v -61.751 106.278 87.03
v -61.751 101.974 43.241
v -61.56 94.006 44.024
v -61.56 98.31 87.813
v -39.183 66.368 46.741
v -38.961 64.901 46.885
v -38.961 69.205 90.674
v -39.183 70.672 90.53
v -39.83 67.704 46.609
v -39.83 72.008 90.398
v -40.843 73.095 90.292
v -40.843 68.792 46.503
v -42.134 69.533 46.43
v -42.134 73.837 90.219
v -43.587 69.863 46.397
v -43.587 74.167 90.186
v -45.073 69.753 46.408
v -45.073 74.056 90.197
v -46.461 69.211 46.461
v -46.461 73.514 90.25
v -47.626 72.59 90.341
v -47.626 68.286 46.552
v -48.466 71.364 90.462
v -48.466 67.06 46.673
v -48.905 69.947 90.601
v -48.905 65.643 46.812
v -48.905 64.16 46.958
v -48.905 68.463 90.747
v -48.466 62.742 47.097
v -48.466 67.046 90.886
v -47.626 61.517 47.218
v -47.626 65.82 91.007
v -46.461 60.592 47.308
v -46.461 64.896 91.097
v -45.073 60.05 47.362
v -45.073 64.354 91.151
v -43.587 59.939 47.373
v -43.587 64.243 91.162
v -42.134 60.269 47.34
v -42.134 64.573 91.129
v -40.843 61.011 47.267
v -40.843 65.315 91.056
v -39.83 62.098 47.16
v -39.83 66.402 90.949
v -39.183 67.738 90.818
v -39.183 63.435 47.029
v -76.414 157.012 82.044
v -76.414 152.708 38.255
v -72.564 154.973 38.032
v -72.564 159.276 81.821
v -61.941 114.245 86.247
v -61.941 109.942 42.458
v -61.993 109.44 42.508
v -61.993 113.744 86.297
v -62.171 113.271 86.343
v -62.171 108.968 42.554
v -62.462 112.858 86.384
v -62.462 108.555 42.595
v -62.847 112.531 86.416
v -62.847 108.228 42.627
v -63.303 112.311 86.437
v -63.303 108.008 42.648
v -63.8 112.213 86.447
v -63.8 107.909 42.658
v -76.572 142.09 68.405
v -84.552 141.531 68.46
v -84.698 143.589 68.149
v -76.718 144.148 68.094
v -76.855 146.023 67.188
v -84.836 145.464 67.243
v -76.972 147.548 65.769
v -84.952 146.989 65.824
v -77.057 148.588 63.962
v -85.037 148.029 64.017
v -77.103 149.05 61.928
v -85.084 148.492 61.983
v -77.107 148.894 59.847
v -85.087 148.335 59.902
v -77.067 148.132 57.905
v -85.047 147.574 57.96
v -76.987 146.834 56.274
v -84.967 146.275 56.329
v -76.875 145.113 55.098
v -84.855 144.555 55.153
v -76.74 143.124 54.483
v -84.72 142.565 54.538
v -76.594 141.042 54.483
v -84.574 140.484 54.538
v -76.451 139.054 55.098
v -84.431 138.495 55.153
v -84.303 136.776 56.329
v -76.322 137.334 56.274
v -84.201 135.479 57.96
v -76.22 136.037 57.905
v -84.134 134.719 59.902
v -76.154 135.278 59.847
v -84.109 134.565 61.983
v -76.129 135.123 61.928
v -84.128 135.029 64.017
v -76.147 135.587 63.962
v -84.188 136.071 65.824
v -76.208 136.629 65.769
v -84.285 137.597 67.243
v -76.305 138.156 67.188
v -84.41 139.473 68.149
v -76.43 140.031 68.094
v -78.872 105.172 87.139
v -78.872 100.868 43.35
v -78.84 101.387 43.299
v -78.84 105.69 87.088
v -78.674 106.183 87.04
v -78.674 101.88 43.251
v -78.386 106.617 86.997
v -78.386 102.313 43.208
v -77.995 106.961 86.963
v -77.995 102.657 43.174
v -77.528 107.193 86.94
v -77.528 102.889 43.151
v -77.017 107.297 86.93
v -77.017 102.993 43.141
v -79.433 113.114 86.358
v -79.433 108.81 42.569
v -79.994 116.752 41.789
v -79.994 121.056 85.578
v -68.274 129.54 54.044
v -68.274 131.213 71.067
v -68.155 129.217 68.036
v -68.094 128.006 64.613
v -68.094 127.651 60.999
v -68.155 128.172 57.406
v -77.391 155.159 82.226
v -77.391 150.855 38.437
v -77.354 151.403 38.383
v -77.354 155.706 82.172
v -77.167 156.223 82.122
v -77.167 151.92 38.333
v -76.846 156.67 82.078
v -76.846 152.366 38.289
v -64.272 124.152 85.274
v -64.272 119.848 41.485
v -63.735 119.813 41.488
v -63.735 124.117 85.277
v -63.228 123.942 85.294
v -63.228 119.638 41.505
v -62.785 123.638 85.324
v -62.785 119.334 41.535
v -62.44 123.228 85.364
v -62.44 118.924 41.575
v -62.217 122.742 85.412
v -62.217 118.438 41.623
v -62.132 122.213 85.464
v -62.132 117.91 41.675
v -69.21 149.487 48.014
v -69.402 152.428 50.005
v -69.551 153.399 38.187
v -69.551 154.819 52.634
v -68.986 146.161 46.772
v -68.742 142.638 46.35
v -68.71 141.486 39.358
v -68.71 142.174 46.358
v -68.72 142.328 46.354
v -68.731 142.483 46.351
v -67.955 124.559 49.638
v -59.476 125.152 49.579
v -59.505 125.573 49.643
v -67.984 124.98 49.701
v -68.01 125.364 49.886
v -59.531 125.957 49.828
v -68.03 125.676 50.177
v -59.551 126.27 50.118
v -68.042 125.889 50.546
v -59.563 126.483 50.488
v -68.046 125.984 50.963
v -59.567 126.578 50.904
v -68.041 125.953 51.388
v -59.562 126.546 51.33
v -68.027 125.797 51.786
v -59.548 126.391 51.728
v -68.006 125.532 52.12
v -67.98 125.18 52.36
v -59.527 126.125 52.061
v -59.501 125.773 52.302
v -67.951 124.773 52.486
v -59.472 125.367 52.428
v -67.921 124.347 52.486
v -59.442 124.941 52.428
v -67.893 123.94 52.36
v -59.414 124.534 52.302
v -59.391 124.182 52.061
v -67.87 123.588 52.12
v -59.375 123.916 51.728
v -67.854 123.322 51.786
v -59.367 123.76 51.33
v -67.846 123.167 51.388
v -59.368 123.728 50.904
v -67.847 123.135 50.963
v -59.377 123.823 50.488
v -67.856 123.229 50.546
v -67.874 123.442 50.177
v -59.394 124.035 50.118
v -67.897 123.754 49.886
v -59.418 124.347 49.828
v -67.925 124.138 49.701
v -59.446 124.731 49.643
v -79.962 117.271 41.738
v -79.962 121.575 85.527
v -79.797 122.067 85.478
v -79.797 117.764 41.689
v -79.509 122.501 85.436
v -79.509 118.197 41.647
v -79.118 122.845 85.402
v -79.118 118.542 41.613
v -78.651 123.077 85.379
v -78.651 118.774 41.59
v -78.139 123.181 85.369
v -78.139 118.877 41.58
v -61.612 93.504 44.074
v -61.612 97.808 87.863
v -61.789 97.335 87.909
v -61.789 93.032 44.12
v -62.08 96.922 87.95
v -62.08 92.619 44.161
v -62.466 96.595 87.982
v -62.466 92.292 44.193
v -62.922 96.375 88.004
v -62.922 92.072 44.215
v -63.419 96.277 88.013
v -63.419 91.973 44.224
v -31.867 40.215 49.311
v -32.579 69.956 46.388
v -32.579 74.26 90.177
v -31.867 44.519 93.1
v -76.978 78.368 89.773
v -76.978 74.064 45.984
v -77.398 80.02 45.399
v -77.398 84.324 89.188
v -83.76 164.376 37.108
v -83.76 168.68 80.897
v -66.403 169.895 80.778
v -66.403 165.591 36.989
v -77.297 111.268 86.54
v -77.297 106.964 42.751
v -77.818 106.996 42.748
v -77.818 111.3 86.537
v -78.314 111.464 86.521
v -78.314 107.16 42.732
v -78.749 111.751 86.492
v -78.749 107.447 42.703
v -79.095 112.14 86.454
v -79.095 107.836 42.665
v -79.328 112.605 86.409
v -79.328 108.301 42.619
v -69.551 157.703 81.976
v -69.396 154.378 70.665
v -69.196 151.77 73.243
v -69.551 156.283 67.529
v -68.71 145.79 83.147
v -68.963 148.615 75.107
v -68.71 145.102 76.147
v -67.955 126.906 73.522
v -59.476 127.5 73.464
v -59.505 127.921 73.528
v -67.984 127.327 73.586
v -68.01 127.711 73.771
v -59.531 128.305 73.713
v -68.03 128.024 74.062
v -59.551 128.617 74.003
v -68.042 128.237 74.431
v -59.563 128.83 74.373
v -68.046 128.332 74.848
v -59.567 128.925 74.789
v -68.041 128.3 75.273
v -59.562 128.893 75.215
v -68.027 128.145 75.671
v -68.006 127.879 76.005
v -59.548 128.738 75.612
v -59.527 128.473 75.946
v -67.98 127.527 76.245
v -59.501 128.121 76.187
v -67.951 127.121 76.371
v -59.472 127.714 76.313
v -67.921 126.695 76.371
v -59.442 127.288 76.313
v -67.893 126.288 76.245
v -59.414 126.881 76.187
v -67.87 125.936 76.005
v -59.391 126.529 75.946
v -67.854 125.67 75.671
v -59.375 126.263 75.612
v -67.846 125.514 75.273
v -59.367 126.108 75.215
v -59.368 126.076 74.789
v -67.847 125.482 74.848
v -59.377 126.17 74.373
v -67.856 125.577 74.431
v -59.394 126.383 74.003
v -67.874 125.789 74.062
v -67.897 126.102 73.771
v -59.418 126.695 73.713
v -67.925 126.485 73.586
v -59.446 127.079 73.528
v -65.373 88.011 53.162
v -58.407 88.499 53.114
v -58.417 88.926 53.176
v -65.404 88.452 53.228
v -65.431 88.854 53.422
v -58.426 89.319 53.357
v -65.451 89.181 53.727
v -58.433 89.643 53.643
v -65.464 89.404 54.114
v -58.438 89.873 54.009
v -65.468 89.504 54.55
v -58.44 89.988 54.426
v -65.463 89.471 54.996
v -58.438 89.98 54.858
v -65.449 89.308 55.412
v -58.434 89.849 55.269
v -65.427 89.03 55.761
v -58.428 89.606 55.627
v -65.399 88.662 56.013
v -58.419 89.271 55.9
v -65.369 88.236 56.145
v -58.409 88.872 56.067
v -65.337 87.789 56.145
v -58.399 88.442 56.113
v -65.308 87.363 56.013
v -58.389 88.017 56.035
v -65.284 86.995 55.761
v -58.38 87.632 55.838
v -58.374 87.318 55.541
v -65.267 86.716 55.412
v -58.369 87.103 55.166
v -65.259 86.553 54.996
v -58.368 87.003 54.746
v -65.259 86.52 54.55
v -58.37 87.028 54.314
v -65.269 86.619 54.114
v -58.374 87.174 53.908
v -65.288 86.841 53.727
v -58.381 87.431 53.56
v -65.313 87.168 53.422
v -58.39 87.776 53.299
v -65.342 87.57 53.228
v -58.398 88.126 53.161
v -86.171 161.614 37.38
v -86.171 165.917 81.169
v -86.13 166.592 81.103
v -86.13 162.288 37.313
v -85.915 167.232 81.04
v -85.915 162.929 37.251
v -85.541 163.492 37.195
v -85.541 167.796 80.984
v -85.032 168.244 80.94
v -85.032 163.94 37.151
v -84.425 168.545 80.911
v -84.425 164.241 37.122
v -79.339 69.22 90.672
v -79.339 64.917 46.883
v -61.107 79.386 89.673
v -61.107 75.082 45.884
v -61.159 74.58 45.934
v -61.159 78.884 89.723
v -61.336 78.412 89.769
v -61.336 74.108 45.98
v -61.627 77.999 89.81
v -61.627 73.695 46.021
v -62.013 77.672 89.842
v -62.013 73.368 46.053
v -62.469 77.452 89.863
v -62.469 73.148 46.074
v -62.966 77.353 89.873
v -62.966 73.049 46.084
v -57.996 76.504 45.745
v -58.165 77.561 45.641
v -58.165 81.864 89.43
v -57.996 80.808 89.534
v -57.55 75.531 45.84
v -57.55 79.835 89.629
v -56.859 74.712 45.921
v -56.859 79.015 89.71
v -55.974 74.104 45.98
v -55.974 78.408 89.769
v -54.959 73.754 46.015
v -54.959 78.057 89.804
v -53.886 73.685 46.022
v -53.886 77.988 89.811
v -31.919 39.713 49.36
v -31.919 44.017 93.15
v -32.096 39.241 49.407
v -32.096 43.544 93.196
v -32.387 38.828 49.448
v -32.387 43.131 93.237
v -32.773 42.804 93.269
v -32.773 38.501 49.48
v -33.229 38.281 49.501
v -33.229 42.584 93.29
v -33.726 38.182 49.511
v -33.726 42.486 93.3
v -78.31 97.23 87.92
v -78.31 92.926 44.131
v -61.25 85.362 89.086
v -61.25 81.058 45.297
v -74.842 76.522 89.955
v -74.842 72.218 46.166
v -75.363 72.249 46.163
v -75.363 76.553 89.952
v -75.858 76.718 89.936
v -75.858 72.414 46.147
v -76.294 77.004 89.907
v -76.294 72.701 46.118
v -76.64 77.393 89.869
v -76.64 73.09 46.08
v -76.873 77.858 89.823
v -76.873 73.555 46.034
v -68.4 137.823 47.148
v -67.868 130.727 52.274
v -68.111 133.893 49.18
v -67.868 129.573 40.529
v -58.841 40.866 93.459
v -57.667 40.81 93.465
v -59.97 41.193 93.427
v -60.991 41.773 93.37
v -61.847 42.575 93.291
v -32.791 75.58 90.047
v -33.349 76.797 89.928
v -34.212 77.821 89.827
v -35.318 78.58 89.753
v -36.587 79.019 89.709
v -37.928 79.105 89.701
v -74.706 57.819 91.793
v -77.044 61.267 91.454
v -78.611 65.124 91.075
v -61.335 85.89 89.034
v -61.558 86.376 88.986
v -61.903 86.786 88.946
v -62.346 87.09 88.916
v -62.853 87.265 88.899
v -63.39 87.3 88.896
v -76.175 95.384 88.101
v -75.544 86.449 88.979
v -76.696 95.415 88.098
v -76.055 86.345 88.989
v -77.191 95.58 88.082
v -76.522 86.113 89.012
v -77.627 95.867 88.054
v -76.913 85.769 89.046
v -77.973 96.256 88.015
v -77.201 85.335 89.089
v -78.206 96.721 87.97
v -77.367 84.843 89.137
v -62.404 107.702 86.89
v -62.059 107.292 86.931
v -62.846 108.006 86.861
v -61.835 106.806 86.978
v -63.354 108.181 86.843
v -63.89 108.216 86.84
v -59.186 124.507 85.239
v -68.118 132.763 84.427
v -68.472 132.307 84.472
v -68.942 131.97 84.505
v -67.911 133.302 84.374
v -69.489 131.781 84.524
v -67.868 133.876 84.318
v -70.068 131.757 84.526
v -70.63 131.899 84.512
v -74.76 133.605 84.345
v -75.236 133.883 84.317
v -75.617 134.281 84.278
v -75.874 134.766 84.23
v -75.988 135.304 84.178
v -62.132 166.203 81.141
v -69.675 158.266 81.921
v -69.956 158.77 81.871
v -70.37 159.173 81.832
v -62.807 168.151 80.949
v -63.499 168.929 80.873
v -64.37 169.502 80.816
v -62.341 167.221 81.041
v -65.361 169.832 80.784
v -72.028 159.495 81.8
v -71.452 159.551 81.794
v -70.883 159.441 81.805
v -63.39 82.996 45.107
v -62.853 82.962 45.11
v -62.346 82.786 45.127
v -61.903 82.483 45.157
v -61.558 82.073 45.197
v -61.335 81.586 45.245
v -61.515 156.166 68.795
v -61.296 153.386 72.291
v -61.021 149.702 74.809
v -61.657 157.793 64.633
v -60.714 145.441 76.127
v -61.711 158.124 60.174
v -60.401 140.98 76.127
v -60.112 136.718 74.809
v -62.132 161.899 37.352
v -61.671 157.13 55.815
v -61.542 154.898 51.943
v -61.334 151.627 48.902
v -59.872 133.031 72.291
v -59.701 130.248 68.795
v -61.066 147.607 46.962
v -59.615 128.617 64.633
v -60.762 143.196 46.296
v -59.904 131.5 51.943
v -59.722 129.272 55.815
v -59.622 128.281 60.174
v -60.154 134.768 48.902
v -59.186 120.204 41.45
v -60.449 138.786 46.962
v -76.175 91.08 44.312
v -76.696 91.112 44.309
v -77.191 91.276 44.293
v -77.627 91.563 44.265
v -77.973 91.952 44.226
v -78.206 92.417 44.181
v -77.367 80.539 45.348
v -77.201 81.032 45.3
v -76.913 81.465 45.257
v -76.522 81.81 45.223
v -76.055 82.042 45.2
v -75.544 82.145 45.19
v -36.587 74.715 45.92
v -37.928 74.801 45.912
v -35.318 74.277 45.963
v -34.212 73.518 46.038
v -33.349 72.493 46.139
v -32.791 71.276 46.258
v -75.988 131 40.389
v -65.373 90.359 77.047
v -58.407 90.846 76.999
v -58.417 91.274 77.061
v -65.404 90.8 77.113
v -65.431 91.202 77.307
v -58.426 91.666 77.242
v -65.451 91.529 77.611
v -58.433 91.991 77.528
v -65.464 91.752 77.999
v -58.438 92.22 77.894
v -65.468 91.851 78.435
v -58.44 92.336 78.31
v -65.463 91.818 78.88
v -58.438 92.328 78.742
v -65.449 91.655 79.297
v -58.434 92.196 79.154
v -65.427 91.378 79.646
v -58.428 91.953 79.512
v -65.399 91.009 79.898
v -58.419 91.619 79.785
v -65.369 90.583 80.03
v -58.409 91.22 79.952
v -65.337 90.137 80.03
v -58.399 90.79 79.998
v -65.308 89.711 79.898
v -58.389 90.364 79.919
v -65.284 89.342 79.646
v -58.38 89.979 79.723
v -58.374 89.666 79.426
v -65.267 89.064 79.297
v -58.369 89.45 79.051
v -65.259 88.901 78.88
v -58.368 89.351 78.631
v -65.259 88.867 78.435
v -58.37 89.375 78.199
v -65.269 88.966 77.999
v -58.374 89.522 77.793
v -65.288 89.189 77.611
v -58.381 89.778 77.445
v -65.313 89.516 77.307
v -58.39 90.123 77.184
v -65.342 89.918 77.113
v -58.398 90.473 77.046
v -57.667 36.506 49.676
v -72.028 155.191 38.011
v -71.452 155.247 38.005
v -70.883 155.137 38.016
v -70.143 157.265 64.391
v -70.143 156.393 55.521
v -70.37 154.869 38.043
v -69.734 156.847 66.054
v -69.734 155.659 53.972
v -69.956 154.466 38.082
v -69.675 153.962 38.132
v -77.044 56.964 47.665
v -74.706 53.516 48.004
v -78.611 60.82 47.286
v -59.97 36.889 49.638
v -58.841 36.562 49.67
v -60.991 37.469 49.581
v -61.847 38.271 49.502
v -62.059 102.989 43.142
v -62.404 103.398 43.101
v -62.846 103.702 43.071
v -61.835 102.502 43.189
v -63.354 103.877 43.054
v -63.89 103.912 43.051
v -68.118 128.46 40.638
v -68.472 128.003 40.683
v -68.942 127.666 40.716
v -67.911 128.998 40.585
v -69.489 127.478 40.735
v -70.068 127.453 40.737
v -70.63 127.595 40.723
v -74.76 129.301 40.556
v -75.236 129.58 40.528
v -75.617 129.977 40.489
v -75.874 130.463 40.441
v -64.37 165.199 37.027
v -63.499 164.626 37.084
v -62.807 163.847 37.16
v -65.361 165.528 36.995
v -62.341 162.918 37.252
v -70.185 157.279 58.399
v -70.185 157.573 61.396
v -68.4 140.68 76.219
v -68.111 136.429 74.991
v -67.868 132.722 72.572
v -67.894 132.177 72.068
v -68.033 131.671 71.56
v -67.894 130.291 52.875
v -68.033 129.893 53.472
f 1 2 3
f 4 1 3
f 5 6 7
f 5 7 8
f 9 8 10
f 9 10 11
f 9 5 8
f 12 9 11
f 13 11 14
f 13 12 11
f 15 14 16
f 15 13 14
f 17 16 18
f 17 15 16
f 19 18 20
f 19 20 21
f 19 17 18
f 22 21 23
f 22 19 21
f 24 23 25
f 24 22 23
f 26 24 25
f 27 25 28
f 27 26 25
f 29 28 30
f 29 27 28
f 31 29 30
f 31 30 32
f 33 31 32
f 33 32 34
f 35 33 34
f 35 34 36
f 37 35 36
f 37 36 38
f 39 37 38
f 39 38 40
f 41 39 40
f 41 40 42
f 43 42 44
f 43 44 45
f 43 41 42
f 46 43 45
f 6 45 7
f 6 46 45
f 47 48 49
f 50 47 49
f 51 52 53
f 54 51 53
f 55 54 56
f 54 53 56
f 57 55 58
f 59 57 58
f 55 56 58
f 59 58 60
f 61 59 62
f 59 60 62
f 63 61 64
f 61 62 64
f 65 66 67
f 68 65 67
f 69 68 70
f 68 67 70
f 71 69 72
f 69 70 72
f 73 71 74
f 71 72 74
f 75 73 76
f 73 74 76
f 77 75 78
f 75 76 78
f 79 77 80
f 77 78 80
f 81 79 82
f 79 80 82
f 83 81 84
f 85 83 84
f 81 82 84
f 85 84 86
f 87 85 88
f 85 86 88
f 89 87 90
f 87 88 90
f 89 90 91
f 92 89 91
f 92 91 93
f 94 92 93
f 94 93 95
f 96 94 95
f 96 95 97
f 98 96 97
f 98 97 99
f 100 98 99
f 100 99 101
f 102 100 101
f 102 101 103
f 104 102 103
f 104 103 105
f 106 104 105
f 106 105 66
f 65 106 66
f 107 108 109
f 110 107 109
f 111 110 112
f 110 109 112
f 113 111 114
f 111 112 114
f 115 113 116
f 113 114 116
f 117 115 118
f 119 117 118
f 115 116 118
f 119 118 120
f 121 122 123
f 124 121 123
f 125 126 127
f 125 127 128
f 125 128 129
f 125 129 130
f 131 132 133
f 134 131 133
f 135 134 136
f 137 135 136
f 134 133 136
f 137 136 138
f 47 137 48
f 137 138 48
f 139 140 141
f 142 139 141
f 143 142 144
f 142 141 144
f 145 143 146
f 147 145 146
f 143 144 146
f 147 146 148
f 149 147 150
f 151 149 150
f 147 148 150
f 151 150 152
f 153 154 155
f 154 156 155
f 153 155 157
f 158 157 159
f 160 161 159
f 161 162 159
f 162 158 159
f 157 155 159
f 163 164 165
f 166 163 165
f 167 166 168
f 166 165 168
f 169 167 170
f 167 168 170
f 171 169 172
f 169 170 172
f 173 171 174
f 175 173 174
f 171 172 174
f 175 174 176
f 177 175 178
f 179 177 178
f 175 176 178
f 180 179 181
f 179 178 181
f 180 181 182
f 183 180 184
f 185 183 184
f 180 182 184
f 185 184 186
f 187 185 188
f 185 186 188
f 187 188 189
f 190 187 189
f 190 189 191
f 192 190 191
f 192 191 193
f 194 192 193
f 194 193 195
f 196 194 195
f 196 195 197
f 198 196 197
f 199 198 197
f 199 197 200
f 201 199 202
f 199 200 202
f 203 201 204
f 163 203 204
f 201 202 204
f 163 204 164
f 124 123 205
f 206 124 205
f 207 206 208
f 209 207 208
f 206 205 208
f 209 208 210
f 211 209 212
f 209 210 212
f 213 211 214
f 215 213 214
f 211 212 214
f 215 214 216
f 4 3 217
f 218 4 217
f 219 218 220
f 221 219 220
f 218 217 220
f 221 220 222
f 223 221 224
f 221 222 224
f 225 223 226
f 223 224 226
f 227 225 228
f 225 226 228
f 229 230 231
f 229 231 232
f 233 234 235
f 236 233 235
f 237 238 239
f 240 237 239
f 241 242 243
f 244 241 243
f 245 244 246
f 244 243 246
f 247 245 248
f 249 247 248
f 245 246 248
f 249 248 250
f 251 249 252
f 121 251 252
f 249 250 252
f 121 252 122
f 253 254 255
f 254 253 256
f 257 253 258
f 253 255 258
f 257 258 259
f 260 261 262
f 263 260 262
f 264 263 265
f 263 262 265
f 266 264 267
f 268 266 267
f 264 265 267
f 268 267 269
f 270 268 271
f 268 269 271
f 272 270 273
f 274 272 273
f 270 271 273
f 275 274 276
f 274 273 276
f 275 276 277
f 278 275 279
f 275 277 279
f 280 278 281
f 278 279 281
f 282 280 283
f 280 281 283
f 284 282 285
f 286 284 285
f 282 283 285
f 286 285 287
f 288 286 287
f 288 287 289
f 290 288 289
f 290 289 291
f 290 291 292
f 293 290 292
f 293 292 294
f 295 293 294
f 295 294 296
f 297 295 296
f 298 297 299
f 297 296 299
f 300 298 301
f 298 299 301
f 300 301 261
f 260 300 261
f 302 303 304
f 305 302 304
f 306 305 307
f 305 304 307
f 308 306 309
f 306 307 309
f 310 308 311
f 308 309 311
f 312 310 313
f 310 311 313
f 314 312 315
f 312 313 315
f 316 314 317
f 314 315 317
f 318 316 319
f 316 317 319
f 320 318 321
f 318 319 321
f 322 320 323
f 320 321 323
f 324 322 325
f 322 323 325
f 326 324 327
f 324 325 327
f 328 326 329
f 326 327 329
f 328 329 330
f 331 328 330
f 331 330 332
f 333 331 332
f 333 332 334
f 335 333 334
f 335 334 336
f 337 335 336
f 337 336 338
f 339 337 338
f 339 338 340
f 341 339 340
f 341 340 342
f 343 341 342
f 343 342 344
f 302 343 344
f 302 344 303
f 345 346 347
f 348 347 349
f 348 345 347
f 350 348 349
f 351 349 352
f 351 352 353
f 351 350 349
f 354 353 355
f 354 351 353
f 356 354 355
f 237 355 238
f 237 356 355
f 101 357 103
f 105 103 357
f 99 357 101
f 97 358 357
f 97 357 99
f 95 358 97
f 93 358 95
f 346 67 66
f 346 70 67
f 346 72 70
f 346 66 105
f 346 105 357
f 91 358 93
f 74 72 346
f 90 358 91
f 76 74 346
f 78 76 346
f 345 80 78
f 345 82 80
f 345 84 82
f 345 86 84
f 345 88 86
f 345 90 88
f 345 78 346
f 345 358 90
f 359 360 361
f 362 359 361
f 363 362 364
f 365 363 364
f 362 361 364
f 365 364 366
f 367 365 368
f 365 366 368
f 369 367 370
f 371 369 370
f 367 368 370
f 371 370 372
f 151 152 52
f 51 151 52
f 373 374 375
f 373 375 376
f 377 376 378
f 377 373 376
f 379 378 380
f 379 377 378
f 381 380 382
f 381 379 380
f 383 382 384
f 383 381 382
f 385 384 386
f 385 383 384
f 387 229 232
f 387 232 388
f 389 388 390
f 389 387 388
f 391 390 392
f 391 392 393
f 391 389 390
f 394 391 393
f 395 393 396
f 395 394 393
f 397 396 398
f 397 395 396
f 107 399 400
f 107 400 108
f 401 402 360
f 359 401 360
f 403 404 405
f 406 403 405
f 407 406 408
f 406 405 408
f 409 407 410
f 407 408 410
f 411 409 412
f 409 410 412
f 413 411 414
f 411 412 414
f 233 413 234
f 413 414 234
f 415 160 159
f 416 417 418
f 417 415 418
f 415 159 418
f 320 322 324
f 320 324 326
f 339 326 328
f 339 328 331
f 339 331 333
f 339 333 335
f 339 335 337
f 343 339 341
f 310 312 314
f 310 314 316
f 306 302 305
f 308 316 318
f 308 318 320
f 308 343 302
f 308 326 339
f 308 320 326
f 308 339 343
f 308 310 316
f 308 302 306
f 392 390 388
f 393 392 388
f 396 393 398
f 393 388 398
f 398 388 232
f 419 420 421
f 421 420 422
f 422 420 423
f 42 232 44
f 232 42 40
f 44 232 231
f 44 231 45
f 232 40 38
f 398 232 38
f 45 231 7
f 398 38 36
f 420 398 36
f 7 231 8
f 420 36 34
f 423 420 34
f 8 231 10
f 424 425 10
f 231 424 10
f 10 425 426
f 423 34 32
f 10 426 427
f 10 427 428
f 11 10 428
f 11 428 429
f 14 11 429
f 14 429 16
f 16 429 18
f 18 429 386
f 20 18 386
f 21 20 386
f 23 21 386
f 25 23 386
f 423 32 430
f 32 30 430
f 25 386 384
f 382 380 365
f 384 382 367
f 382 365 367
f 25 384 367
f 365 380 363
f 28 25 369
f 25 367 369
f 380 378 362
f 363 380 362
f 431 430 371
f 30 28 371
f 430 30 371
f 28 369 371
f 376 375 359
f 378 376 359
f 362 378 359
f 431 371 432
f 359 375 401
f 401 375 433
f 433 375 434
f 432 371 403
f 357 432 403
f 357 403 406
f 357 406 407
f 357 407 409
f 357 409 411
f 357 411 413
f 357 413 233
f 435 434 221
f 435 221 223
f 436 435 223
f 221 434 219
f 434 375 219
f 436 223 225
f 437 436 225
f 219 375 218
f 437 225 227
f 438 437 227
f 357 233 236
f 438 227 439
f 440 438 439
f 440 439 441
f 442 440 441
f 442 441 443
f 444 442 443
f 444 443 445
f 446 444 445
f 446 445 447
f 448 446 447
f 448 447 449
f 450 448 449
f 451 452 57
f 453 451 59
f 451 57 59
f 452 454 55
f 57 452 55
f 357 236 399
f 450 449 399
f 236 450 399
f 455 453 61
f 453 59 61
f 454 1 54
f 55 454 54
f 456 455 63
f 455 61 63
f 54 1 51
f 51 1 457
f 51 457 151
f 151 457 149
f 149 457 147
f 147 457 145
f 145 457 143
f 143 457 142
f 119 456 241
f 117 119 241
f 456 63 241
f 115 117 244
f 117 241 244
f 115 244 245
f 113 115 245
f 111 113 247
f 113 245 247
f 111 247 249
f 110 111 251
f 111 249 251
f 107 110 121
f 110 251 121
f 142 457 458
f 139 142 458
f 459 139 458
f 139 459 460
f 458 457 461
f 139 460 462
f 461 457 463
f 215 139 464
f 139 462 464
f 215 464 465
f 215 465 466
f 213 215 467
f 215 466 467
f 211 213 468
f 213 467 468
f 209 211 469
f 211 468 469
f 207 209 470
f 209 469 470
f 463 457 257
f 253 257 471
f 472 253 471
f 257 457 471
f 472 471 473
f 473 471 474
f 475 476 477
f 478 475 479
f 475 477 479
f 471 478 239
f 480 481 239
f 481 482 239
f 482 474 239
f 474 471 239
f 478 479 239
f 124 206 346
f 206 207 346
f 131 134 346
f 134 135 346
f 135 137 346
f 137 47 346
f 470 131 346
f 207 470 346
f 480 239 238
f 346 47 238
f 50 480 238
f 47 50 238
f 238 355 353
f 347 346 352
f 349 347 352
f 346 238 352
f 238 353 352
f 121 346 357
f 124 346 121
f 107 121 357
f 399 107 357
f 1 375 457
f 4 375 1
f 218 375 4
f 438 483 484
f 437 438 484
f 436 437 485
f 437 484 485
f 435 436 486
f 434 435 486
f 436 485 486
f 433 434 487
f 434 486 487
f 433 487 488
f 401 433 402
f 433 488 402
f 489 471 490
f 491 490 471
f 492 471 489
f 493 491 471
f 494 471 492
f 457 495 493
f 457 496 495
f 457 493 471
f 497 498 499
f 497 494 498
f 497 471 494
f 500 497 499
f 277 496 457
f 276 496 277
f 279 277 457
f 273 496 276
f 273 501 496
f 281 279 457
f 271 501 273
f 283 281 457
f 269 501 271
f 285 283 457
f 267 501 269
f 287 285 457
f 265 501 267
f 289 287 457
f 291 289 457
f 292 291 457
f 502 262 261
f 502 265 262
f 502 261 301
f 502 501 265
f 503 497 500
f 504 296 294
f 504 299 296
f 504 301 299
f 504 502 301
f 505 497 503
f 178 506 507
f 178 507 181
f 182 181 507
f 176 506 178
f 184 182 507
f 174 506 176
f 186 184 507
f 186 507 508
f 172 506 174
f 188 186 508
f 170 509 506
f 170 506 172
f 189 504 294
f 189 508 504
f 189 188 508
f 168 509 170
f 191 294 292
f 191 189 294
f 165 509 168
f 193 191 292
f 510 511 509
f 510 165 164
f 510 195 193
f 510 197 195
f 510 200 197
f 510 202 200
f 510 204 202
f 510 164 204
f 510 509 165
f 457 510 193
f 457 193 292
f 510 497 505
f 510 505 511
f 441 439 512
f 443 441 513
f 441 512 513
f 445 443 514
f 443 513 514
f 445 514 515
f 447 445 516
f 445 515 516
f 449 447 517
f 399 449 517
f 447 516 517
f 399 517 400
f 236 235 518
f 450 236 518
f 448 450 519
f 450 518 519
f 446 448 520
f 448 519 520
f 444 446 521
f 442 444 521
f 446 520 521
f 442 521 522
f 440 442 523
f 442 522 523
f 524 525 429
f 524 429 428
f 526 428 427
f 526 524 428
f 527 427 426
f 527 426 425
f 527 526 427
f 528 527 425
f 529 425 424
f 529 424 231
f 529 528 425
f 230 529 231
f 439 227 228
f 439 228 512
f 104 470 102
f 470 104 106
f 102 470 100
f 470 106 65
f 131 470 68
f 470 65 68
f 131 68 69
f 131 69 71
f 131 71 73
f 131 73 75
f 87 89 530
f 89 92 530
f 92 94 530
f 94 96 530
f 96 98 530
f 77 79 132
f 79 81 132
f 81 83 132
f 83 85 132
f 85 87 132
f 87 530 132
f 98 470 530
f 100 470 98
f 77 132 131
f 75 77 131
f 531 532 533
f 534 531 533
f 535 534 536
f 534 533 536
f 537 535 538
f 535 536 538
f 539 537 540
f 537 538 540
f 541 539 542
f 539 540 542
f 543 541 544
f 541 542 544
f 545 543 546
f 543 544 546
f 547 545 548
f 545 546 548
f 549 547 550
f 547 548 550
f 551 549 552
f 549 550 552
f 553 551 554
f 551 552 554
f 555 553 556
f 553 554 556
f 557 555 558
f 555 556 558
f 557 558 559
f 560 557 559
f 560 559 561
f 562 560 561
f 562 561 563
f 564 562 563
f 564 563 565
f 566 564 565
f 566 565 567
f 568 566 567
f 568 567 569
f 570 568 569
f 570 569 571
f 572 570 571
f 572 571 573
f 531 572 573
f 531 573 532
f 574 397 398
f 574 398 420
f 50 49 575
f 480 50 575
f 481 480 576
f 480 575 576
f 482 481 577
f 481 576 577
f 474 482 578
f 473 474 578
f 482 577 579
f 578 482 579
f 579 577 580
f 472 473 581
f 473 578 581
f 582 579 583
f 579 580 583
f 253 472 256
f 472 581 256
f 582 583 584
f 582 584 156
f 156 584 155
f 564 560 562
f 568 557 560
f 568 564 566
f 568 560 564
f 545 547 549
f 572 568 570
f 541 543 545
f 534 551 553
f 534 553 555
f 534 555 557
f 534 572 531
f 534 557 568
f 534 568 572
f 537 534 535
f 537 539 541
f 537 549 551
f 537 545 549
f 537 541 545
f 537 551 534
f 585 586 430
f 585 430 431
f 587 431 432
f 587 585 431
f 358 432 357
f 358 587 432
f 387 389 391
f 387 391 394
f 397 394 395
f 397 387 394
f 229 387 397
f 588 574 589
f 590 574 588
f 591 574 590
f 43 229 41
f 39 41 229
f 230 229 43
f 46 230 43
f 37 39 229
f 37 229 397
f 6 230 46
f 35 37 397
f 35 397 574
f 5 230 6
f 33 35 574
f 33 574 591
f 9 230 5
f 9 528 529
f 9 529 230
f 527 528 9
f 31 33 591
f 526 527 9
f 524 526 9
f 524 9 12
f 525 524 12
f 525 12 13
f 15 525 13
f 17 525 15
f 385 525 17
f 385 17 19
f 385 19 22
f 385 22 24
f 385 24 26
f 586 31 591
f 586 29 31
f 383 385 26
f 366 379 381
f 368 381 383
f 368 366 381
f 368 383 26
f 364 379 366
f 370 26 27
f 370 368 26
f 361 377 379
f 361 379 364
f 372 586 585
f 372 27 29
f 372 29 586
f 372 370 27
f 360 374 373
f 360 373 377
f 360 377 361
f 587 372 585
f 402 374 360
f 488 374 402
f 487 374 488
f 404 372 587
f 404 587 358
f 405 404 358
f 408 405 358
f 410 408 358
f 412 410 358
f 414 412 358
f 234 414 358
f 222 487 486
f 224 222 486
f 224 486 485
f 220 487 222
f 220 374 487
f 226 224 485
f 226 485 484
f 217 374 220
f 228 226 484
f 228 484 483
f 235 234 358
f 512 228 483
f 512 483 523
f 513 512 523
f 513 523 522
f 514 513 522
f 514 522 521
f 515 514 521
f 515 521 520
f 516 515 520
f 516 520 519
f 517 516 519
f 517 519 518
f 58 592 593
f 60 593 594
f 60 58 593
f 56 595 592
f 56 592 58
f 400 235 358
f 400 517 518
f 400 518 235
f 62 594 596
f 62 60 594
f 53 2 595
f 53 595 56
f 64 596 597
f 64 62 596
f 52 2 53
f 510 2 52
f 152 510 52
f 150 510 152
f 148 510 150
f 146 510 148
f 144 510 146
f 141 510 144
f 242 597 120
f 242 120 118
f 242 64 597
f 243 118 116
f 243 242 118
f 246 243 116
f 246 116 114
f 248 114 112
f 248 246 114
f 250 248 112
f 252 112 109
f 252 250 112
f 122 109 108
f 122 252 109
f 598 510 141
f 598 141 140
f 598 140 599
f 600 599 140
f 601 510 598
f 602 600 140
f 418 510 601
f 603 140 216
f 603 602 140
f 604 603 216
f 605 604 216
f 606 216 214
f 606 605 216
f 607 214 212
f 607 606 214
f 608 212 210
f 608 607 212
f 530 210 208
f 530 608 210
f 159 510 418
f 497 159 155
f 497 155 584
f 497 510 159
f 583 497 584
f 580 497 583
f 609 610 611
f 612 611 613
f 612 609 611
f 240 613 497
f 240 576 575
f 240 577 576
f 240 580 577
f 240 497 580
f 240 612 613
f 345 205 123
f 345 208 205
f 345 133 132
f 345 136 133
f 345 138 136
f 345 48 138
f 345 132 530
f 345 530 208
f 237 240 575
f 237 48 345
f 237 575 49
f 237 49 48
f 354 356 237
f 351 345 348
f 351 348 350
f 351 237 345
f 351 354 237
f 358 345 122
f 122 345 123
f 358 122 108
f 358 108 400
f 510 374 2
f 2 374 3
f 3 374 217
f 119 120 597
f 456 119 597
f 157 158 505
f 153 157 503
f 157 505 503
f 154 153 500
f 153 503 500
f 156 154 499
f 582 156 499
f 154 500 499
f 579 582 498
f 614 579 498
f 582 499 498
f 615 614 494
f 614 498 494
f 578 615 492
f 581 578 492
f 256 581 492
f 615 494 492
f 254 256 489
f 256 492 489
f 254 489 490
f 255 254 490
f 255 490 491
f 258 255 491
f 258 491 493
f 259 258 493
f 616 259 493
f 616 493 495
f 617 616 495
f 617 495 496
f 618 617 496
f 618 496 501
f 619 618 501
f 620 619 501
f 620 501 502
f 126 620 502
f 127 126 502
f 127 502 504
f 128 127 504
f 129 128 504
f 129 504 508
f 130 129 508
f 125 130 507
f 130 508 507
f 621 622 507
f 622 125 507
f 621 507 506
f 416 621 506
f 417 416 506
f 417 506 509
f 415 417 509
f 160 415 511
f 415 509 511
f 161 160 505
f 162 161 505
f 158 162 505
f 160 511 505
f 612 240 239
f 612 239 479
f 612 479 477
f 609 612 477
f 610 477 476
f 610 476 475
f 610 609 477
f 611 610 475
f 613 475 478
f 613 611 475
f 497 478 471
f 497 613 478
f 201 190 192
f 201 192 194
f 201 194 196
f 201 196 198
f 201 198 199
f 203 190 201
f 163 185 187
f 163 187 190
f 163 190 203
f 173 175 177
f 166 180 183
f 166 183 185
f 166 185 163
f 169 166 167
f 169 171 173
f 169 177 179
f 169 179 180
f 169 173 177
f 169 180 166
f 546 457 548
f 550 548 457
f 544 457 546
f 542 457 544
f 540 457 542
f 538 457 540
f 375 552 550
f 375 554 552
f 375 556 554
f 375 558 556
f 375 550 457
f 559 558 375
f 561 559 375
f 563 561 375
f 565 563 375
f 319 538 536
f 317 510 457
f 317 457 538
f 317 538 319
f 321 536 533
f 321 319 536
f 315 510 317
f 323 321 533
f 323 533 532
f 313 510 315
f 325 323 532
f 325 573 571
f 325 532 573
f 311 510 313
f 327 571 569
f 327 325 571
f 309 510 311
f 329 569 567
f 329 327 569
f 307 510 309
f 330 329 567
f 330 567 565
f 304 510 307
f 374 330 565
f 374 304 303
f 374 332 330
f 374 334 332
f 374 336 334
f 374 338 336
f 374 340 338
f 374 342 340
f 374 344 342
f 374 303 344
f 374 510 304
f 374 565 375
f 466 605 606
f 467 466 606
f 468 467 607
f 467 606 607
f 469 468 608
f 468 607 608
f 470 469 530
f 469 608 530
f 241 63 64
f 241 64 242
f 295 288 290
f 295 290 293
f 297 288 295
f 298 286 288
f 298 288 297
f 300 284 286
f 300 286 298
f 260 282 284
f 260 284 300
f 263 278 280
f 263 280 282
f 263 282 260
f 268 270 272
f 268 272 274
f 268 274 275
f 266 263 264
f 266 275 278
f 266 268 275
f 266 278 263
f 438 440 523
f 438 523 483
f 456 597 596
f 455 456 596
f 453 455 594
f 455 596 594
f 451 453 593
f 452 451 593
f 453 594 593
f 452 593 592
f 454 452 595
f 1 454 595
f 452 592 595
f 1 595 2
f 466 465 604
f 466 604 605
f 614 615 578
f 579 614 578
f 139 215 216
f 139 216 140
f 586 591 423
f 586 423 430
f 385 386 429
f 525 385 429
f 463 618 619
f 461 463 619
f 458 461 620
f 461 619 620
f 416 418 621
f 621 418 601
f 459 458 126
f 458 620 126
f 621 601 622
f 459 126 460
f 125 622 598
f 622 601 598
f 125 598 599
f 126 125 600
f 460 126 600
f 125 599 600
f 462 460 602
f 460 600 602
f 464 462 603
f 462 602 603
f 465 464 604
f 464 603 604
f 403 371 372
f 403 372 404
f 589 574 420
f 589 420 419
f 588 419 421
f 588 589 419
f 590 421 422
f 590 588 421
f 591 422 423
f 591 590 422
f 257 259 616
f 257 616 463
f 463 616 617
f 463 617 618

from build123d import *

# Parameters (mm, degrees)
SKETCH2_R           = 5
BOSS_EXTRUDE1_DEPTH = 44
SKETCH4_R           = 7
CUT_EXTRUDE1_DEPTH  = 44
SKETCH3_R           = 15
SKETCH3_R_2         = 1.432268471
SKETCH3_R_3         = 1.5
CUT_EXTRUDE2_DEPTH  = 8.5


with BuildPart() as part:
    # Sketch2 → Boss-Extrude1 (new body)
    with BuildSketch(Plane(origin=(0, 5.184806561, 52.754021043), x_dir=(1, 0, 0), z_dir=(0, 0.097811411, 0.995204968))):
        with BuildLine():
            Line((-79.338568196, 60.019636282), (-86.171283653, 157.182642502))
            ThreePointArc((-86.171283653, 157.182642502), (-85.540604549, 159.070011115), (-83.760075933, 159.958624788))
            Line((-83.760075933, 159.958624788), (-66.40294057, 161.179216572))
            ThreePointArc((-66.40294057, 161.179216572), (-63.499296447, 160.208940992), (-62.13219844, 157.469666101))
            Line((-62.13219844, 157.469666101), (-59.185942386, 115.573132123))
            Line((-59.185942386, 115.573132123), (-58.165469, 72.72467593))
            ThreePointArc((-58.165469, 72.72467593), (-56.858994047, 69.861695577), (-53.88600747, 68.829763352))
            Line((-53.88600747, 68.829763352), (-37.927916785, 69.95197125))
            ThreePointArc((-37.927916785, 69.95197125), (-34.211684563, 68.662057426), (-32.578589401, 65.083334219))
            Line((-32.578589401, 65.083334219), (-31.866862588, 35.198777134))
            ThreePointArc((-31.866862588, 35.198777134), (-32.387188107, 33.80496391), (-33.725997726, 33.156085835))
            Line((-33.725997726, 33.156085835), (-57.666874392, 31.472510939))
            ThreePointArc((-57.666874392, 31.472510939), (-59.969896102, 31.85708433), (-61.84718043, 33.245468007))
            Line((-61.84718043, 33.245468007), (-74.706082713, 48.563713079))
            ThreePointArc((-74.706082713, 48.563713079), (-77.929269747, 53.924929356), (-79.338568196, 60.019636282))
        make_face()
        with Locations((-43.960887699, 60.004258737)):
            Circle(SKETCH2_R, mode=Mode.SUBTRACT)
        with BuildLine():
            Line((-62.966135351, 68.191231545), (-74.842135577, 67.356085192))
            ThreePointArc((-74.842135577, 67.356085192), (-76.293957569, 67.841222959), (-76.97750654, 69.21086034))
            Line((-76.97750654, 69.21086034), (-77.398400264, 75.196079506))
            ThreePointArc((-77.398400264, 75.196079506), (-76.913262497, 76.647901499), (-75.543625116, 77.33145047))
            Line((-75.543625116, 77.33145047), (-63.389739784, 78.186138312))
            ThreePointArc((-63.389739784, 78.186138312), (-61.903246895, 77.670172783), (-61.25000883, 76.2386835))
            Line((-61.25000883, 76.2386835), (-61.107000214, 70.233922844))
            ThreePointArc((-61.107000214, 70.233922844), (-61.627325733, 68.84010962), (-62.966135351, 68.191231545))
        make_face(mode=Mode.SUBTRACT)
        with BuildLine():
            Line((-63.800352281, 103.21900204), (-77.297348966, 102.269863664))
            ThreePointArc((-77.297348966, 102.269863664), (-78.749170958, 102.755001431), (-79.43271993, 104.124638812))
            Line((-79.43271993, 104.124638812), (-79.993911561, 112.104931034))
            ThreePointArc((-79.993911561, 112.104931034), (-79.508773795, 113.556753027), (-78.139136414, 114.240301998))
            Line((-78.139136414, 114.240301998), (-64.271626252, 115.215495692))
            ThreePointArc((-64.271626252, 115.215495692), (-62.785133364, 114.699530163), (-62.131895299, 113.26804088))
            Line((-62.131895299, 113.26804088), (-61.941217144, 105.261693339))
            ThreePointArc((-61.941217144, 105.261693339), (-62.461542663, 103.867880114), (-63.800352281, 103.21900204))
        make_face(mode=Mode.SUBTRACT)
        with BuildLine():
            Line((-76.689803818, 136.396552471), (-77.391293358, 146.371917749))
            ThreePointArc((-77.391293358, 146.371917749), (-77.167089785, 147.441743104), (-76.413930361, 148.233920114))
            Line((-76.413930361, 148.233920114), (-72.564082157, 150.509588985))
            ThreePointArc((-72.564082157, 150.509588985), (-70.616844652, 150.558754011), (-69.551299044, 148.928182436))
            Line((-69.551299044, 148.928182436), (-68.709511596, 136.957744103))
            Line((-68.709511596, 136.957744103), (-67.867724148, 124.987305769))
            ThreePointArc((-67.867724148, 124.987305769), (-68.694580699, 123.223656329), (-70.629534734, 122.999817141))
            Line((-70.629534734, 122.999817141), (-74.759978753, 124.71429438))
            ThreePointArc((-74.759978753, 124.71429438), (-75.616592755, 125.393268596), (-75.988314278, 126.421187193))
            Line((-75.988314278, 126.421187193), (-76.689803818, 136.396552471))
        make_face(mode=Mode.SUBTRACT)
        with BuildLine():
            Line((-63.41899597, 87.206306956), (-76.174965702, 86.30927922))
            ThreePointArc((-76.174965702, 86.30927922), (-77.626787695, 86.794416987), (-78.310336666, 88.164054367))
            Line((-78.310336666, 88.164054367), (-78.871528298, 96.14434659))
            ThreePointArc((-78.871528298, 96.14434659), (-78.386390531, 97.596168582), (-77.01675315, 98.279717553))
            Line((-77.01675315, 98.279717553), (-63.890269942, 99.202800609))
            ThreePointArc((-63.890269942, 99.202800609), (-62.403777053, 98.68683508), (-61.750538988, 97.255345797))
            Line((-61.750538988, 97.255345797), (-61.559860833, 89.248998255))
            ThreePointArc((-61.559860833, 89.248998255), (-62.080186352, 87.855185031), (-63.41899597, 87.206306956))
        make_face(mode=Mode.SUBTRACT)
    extrude(amount=BOSS_EXTRUDE1_DEPTH)

    # Sketch4 → Cut-Extrude1 (cut)
    with BuildSketch(Plane(origin=(-74.74821025, -5.231253014, 0.514141565), x_dir=(0.006844627, 0.000479021, 0.999976461), z_dir=(-0.997536528, -0.069812587, 0.006861368))):
        with Locations((60.947145558, 147.088883585)):
            Circle(SKETCH4_R)
    extrude(amount=-CUT_EXTRUDE1_DEPTH, mode=Mode.SUBTRACT)

    # Sketch3 → Cut-Extrude2 (cut)
    with BuildSketch(Plane(origin=(-50.807333583, -3.555750914, 0.349468729), x_dir=(-0.006844627, -0.000479021, -0.999976461), z_dir=(0.997536528, 0.069812587, -0.006861368))):
        with Locations((-60.947145558, 147.088883585)):
            Circle(SKETCH3_R)
        with Locations((-74.548623077, 131.340873995)):
            Circle(SKETCH3_R_2)
        with Locations((-78.140713739, 94.702052828)):
            Circle(SKETCH3_R_3)
        with Locations((-54.255232262, 92.360306772)):
            Circle(SKETCH3_R_3)
        with Locations((-50.6631416, 128.999127938)):
            Circle(SKETCH3_R_2)
    extrude(amount=-CUT_EXTRUDE2_DEPTH, mode=Mode.SUBTRACT)


solid = part.part
